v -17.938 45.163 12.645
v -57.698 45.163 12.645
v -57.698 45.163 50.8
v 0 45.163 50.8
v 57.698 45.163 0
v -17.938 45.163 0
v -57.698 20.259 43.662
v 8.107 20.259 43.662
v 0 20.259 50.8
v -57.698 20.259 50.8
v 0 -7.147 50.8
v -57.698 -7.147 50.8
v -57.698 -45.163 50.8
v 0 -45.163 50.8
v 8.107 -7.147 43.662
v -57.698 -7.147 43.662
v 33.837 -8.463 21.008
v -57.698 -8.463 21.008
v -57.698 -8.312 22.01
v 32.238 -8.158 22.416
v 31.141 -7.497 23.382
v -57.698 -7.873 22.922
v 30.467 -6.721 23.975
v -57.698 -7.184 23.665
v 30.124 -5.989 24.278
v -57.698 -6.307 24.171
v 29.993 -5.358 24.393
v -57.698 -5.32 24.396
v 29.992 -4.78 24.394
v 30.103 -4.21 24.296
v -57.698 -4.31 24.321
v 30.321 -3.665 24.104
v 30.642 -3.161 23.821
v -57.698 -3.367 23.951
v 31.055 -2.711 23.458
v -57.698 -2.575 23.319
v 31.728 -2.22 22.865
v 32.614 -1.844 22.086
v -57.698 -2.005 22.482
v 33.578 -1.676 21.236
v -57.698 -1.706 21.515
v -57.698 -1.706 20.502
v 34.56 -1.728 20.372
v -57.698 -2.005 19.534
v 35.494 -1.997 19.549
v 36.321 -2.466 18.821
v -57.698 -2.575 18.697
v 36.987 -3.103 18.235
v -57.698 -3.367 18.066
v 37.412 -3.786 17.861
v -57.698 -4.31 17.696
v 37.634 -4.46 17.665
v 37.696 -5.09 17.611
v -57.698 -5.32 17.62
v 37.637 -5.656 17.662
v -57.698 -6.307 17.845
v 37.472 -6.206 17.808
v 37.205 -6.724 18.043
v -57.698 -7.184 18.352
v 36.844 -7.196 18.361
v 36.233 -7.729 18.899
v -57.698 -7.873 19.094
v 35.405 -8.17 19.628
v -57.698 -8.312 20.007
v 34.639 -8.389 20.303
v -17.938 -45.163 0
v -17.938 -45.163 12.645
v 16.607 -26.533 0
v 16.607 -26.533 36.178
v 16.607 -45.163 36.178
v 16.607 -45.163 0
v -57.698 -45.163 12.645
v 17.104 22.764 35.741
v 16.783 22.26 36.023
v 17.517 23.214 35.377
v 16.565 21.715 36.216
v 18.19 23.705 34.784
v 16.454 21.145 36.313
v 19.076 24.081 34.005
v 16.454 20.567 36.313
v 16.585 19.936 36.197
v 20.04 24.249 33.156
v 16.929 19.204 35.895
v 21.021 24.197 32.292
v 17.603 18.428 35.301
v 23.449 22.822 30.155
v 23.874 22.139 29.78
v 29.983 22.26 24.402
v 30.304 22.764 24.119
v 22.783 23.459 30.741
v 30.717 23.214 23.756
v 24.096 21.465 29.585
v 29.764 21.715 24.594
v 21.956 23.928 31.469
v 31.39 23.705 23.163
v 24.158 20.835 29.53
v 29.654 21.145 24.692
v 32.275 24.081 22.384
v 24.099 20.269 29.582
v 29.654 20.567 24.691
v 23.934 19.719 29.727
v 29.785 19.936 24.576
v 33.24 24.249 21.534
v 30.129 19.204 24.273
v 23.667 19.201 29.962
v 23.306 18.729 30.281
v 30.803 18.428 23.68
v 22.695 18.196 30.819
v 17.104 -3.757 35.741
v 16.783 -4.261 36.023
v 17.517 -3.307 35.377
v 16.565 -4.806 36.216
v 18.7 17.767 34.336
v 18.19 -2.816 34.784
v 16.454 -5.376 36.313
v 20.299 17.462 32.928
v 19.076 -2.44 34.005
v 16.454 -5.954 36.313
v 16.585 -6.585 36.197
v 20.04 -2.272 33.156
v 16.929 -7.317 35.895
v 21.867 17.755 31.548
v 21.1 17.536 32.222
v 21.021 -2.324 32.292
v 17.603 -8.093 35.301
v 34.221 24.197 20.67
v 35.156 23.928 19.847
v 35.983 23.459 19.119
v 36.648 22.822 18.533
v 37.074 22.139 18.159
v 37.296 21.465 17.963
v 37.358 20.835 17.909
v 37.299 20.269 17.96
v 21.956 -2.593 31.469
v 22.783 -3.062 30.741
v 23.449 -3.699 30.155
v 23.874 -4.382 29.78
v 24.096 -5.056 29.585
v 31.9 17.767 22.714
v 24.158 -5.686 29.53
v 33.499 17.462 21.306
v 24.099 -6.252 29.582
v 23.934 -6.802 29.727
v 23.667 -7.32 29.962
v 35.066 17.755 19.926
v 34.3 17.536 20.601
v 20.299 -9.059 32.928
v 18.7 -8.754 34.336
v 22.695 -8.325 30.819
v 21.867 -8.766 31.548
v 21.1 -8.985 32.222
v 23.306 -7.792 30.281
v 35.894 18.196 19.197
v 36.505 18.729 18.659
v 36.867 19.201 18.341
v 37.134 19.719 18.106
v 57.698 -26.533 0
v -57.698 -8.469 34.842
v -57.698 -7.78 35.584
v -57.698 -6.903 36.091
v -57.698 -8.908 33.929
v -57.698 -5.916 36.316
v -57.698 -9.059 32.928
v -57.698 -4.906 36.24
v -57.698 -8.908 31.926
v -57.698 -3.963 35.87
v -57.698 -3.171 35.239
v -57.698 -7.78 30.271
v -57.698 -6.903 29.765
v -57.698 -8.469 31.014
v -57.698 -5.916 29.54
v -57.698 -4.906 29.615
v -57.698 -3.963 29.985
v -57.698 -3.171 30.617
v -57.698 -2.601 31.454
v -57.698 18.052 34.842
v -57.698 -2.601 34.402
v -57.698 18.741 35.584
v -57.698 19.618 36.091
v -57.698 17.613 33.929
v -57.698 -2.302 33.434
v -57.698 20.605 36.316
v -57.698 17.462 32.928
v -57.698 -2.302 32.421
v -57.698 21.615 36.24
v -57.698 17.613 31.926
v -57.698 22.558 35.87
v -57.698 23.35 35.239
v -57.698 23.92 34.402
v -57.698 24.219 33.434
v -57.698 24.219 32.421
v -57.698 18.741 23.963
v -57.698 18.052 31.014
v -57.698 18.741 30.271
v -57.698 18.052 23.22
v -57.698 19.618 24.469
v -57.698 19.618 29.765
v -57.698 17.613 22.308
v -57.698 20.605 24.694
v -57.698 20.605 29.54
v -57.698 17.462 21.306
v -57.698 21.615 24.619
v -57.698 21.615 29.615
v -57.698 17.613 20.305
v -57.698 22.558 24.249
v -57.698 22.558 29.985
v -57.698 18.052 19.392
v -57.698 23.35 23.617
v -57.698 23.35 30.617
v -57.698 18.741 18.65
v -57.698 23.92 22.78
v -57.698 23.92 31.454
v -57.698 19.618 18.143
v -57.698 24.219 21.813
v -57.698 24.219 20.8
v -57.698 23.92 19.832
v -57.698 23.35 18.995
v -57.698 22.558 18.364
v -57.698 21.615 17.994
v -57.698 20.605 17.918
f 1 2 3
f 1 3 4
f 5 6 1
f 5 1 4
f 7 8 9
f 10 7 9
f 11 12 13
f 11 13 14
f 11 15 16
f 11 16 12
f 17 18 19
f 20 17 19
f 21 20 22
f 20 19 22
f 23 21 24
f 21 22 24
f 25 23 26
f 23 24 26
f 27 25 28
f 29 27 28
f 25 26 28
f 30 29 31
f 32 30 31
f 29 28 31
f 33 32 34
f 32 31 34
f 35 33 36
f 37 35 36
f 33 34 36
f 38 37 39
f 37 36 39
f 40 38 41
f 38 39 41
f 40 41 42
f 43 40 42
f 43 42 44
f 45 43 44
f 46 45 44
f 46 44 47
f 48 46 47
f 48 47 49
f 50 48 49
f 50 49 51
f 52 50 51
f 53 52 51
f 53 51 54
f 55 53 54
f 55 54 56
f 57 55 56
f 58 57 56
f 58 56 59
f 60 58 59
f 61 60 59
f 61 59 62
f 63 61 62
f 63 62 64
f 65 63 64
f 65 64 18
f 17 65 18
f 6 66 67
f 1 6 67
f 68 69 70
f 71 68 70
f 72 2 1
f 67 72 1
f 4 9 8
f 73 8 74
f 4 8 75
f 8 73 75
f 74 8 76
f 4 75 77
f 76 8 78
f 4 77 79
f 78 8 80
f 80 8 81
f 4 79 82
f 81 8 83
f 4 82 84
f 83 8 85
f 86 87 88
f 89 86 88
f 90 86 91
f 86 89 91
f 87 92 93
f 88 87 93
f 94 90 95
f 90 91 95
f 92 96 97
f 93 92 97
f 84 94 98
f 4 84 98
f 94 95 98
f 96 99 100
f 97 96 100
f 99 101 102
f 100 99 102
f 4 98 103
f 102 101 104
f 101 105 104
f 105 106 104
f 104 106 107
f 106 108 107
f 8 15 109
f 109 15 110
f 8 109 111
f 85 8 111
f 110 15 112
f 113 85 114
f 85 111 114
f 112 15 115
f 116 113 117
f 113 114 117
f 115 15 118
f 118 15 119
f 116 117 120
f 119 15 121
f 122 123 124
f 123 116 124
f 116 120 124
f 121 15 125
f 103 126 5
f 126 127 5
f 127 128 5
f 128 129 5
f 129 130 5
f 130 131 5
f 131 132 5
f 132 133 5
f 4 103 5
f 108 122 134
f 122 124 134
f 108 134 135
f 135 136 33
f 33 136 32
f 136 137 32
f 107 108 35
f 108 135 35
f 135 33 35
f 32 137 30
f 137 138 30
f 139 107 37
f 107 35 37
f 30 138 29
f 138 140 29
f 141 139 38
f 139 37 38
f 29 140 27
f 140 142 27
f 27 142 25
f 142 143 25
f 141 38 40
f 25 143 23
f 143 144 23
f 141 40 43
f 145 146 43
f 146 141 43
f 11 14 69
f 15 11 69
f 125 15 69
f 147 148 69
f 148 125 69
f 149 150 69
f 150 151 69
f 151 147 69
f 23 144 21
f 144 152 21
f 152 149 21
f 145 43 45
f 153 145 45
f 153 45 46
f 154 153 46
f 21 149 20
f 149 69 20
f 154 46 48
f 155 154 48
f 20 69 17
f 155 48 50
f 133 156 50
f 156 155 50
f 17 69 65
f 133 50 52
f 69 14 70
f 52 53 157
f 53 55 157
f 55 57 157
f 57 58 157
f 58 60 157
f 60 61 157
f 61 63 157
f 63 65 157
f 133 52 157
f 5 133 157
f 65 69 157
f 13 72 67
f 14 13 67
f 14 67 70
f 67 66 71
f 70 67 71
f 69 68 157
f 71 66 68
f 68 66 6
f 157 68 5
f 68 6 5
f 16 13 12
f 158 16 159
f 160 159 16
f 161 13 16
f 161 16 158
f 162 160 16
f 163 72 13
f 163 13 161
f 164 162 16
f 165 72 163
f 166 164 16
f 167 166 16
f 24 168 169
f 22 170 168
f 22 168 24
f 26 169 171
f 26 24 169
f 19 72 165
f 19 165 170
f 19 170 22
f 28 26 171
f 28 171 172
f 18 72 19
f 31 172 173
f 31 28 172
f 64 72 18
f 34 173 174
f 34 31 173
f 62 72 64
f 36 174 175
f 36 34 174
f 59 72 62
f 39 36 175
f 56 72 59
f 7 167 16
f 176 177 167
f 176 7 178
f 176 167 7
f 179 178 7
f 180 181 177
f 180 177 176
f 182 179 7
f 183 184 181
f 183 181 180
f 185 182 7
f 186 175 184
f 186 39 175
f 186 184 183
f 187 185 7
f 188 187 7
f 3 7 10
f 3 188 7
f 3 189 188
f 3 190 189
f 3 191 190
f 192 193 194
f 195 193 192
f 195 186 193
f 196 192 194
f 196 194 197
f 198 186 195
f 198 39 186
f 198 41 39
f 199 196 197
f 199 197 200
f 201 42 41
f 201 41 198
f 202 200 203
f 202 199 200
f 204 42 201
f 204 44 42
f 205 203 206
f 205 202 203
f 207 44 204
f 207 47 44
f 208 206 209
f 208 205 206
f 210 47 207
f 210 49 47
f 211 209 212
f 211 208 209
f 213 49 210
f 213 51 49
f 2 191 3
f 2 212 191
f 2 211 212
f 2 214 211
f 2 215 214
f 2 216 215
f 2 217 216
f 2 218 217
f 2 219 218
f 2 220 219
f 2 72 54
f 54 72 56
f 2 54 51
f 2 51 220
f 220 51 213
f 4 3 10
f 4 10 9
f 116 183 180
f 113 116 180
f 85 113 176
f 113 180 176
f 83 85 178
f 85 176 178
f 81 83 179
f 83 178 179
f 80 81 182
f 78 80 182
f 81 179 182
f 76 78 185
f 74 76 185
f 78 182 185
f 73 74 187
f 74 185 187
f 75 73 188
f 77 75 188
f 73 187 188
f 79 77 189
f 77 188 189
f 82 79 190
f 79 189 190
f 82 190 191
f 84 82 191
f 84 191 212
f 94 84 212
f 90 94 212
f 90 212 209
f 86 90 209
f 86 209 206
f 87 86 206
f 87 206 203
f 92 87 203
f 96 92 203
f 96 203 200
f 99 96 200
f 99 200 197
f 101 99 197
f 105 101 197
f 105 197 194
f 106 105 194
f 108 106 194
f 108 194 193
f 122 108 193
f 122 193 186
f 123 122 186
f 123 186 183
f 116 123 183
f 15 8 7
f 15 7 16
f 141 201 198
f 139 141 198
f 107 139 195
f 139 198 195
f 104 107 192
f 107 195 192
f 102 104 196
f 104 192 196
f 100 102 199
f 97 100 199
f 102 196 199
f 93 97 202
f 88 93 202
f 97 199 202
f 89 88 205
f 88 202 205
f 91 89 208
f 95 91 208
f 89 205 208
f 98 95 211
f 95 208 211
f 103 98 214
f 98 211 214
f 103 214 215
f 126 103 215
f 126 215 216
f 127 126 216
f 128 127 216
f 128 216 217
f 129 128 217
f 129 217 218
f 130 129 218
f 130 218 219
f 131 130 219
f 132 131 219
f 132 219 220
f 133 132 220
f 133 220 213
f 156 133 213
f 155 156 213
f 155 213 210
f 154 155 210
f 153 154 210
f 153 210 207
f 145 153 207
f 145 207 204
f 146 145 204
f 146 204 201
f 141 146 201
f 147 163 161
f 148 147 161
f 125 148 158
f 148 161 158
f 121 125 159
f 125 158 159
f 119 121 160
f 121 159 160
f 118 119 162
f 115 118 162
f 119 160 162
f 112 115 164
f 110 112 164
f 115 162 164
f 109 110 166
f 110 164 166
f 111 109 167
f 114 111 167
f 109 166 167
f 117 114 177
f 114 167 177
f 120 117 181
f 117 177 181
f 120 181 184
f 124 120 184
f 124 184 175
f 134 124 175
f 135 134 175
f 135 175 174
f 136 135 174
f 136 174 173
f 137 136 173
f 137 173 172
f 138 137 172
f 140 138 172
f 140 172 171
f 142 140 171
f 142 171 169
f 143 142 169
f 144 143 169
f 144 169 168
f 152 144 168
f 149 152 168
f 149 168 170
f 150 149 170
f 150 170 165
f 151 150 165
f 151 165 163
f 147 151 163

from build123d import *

# Parameters (mm, degrees)
F0_W     = 115.3964325786
F0_H     = 90.326808393
F1_DEPTH = 50.8
F2_W     = 39.7604890168
F2_H     = 12.6452748664
F3_DEPTH = 90.327808393
F4_W     = 41.0910267383
F4_H     = 18.6301916838
F5_DEPTH = 50.801
F6_R     = 3.3975971179
F6_W     = 27.4064959049
F6_H     = 7.1375382304
F7_DEPTH = 115.3974325786


with BuildPart() as f1:
    # F0 (on Top) → F1 (new body)
    with BuildSketch(Plane.XY):
        Rectangle(F0_W, F0_H)
    extrude(amount=F1_DEPTH)

    # F2 (on face) → F3 (cut, through all)
    with BuildSketch(Plane.XZ.offset(45.1634041965)):
        Polygon((57.6982162893, 50.8), (0, 50.8), (57.6982162893, 0), align=None)
        with Locations((-37.8179717809, 6.3226374332)):
            Rectangle(F2_W, F2_H)
    extrude(amount=-F3_DEPTH, mode=Mode.SUBTRACT)

    # F4 (on face) → F5 (cut, through all)
    with BuildSketch(Plane(origin=(0, 0, 0), x_dir=(1, 0, 0), z_dir=(0, 0, -1))):
        with Locations((37.1527029201, 35.8483083546)):
            Rectangle(F4_W, F4_H)
    extrude(amount=-F5_DEPTH, mode=Mode.SUBTRACT)

    # F6 (on face) → F7 (cut, through all)
    with BuildSketch(Plane(origin=(-57.6982162893, 0, 0), x_dir=(0, -1, 0), z_dir=(-1, 0, 0))):
        with Locations((-20.8592172712, 21.3062018156)):
            Circle(F6_R)
        with Locations((-20.8592191339, 32.9277664423)):
            Circle(F6_R)
        with Locations((5.6617897935, 32.9277664423)):
            Circle(F6_R)
        with Locations((5.065811798, 21.008213982)):
            Circle(F6_R)
        with Locations((-6.5557556227, 47.2312308848)):
            Rectangle(F6_W, F6_H)
    extrude(amount=-F7_DEPTH, mode=Mode.SUBTRACT)


solid = f1.part
